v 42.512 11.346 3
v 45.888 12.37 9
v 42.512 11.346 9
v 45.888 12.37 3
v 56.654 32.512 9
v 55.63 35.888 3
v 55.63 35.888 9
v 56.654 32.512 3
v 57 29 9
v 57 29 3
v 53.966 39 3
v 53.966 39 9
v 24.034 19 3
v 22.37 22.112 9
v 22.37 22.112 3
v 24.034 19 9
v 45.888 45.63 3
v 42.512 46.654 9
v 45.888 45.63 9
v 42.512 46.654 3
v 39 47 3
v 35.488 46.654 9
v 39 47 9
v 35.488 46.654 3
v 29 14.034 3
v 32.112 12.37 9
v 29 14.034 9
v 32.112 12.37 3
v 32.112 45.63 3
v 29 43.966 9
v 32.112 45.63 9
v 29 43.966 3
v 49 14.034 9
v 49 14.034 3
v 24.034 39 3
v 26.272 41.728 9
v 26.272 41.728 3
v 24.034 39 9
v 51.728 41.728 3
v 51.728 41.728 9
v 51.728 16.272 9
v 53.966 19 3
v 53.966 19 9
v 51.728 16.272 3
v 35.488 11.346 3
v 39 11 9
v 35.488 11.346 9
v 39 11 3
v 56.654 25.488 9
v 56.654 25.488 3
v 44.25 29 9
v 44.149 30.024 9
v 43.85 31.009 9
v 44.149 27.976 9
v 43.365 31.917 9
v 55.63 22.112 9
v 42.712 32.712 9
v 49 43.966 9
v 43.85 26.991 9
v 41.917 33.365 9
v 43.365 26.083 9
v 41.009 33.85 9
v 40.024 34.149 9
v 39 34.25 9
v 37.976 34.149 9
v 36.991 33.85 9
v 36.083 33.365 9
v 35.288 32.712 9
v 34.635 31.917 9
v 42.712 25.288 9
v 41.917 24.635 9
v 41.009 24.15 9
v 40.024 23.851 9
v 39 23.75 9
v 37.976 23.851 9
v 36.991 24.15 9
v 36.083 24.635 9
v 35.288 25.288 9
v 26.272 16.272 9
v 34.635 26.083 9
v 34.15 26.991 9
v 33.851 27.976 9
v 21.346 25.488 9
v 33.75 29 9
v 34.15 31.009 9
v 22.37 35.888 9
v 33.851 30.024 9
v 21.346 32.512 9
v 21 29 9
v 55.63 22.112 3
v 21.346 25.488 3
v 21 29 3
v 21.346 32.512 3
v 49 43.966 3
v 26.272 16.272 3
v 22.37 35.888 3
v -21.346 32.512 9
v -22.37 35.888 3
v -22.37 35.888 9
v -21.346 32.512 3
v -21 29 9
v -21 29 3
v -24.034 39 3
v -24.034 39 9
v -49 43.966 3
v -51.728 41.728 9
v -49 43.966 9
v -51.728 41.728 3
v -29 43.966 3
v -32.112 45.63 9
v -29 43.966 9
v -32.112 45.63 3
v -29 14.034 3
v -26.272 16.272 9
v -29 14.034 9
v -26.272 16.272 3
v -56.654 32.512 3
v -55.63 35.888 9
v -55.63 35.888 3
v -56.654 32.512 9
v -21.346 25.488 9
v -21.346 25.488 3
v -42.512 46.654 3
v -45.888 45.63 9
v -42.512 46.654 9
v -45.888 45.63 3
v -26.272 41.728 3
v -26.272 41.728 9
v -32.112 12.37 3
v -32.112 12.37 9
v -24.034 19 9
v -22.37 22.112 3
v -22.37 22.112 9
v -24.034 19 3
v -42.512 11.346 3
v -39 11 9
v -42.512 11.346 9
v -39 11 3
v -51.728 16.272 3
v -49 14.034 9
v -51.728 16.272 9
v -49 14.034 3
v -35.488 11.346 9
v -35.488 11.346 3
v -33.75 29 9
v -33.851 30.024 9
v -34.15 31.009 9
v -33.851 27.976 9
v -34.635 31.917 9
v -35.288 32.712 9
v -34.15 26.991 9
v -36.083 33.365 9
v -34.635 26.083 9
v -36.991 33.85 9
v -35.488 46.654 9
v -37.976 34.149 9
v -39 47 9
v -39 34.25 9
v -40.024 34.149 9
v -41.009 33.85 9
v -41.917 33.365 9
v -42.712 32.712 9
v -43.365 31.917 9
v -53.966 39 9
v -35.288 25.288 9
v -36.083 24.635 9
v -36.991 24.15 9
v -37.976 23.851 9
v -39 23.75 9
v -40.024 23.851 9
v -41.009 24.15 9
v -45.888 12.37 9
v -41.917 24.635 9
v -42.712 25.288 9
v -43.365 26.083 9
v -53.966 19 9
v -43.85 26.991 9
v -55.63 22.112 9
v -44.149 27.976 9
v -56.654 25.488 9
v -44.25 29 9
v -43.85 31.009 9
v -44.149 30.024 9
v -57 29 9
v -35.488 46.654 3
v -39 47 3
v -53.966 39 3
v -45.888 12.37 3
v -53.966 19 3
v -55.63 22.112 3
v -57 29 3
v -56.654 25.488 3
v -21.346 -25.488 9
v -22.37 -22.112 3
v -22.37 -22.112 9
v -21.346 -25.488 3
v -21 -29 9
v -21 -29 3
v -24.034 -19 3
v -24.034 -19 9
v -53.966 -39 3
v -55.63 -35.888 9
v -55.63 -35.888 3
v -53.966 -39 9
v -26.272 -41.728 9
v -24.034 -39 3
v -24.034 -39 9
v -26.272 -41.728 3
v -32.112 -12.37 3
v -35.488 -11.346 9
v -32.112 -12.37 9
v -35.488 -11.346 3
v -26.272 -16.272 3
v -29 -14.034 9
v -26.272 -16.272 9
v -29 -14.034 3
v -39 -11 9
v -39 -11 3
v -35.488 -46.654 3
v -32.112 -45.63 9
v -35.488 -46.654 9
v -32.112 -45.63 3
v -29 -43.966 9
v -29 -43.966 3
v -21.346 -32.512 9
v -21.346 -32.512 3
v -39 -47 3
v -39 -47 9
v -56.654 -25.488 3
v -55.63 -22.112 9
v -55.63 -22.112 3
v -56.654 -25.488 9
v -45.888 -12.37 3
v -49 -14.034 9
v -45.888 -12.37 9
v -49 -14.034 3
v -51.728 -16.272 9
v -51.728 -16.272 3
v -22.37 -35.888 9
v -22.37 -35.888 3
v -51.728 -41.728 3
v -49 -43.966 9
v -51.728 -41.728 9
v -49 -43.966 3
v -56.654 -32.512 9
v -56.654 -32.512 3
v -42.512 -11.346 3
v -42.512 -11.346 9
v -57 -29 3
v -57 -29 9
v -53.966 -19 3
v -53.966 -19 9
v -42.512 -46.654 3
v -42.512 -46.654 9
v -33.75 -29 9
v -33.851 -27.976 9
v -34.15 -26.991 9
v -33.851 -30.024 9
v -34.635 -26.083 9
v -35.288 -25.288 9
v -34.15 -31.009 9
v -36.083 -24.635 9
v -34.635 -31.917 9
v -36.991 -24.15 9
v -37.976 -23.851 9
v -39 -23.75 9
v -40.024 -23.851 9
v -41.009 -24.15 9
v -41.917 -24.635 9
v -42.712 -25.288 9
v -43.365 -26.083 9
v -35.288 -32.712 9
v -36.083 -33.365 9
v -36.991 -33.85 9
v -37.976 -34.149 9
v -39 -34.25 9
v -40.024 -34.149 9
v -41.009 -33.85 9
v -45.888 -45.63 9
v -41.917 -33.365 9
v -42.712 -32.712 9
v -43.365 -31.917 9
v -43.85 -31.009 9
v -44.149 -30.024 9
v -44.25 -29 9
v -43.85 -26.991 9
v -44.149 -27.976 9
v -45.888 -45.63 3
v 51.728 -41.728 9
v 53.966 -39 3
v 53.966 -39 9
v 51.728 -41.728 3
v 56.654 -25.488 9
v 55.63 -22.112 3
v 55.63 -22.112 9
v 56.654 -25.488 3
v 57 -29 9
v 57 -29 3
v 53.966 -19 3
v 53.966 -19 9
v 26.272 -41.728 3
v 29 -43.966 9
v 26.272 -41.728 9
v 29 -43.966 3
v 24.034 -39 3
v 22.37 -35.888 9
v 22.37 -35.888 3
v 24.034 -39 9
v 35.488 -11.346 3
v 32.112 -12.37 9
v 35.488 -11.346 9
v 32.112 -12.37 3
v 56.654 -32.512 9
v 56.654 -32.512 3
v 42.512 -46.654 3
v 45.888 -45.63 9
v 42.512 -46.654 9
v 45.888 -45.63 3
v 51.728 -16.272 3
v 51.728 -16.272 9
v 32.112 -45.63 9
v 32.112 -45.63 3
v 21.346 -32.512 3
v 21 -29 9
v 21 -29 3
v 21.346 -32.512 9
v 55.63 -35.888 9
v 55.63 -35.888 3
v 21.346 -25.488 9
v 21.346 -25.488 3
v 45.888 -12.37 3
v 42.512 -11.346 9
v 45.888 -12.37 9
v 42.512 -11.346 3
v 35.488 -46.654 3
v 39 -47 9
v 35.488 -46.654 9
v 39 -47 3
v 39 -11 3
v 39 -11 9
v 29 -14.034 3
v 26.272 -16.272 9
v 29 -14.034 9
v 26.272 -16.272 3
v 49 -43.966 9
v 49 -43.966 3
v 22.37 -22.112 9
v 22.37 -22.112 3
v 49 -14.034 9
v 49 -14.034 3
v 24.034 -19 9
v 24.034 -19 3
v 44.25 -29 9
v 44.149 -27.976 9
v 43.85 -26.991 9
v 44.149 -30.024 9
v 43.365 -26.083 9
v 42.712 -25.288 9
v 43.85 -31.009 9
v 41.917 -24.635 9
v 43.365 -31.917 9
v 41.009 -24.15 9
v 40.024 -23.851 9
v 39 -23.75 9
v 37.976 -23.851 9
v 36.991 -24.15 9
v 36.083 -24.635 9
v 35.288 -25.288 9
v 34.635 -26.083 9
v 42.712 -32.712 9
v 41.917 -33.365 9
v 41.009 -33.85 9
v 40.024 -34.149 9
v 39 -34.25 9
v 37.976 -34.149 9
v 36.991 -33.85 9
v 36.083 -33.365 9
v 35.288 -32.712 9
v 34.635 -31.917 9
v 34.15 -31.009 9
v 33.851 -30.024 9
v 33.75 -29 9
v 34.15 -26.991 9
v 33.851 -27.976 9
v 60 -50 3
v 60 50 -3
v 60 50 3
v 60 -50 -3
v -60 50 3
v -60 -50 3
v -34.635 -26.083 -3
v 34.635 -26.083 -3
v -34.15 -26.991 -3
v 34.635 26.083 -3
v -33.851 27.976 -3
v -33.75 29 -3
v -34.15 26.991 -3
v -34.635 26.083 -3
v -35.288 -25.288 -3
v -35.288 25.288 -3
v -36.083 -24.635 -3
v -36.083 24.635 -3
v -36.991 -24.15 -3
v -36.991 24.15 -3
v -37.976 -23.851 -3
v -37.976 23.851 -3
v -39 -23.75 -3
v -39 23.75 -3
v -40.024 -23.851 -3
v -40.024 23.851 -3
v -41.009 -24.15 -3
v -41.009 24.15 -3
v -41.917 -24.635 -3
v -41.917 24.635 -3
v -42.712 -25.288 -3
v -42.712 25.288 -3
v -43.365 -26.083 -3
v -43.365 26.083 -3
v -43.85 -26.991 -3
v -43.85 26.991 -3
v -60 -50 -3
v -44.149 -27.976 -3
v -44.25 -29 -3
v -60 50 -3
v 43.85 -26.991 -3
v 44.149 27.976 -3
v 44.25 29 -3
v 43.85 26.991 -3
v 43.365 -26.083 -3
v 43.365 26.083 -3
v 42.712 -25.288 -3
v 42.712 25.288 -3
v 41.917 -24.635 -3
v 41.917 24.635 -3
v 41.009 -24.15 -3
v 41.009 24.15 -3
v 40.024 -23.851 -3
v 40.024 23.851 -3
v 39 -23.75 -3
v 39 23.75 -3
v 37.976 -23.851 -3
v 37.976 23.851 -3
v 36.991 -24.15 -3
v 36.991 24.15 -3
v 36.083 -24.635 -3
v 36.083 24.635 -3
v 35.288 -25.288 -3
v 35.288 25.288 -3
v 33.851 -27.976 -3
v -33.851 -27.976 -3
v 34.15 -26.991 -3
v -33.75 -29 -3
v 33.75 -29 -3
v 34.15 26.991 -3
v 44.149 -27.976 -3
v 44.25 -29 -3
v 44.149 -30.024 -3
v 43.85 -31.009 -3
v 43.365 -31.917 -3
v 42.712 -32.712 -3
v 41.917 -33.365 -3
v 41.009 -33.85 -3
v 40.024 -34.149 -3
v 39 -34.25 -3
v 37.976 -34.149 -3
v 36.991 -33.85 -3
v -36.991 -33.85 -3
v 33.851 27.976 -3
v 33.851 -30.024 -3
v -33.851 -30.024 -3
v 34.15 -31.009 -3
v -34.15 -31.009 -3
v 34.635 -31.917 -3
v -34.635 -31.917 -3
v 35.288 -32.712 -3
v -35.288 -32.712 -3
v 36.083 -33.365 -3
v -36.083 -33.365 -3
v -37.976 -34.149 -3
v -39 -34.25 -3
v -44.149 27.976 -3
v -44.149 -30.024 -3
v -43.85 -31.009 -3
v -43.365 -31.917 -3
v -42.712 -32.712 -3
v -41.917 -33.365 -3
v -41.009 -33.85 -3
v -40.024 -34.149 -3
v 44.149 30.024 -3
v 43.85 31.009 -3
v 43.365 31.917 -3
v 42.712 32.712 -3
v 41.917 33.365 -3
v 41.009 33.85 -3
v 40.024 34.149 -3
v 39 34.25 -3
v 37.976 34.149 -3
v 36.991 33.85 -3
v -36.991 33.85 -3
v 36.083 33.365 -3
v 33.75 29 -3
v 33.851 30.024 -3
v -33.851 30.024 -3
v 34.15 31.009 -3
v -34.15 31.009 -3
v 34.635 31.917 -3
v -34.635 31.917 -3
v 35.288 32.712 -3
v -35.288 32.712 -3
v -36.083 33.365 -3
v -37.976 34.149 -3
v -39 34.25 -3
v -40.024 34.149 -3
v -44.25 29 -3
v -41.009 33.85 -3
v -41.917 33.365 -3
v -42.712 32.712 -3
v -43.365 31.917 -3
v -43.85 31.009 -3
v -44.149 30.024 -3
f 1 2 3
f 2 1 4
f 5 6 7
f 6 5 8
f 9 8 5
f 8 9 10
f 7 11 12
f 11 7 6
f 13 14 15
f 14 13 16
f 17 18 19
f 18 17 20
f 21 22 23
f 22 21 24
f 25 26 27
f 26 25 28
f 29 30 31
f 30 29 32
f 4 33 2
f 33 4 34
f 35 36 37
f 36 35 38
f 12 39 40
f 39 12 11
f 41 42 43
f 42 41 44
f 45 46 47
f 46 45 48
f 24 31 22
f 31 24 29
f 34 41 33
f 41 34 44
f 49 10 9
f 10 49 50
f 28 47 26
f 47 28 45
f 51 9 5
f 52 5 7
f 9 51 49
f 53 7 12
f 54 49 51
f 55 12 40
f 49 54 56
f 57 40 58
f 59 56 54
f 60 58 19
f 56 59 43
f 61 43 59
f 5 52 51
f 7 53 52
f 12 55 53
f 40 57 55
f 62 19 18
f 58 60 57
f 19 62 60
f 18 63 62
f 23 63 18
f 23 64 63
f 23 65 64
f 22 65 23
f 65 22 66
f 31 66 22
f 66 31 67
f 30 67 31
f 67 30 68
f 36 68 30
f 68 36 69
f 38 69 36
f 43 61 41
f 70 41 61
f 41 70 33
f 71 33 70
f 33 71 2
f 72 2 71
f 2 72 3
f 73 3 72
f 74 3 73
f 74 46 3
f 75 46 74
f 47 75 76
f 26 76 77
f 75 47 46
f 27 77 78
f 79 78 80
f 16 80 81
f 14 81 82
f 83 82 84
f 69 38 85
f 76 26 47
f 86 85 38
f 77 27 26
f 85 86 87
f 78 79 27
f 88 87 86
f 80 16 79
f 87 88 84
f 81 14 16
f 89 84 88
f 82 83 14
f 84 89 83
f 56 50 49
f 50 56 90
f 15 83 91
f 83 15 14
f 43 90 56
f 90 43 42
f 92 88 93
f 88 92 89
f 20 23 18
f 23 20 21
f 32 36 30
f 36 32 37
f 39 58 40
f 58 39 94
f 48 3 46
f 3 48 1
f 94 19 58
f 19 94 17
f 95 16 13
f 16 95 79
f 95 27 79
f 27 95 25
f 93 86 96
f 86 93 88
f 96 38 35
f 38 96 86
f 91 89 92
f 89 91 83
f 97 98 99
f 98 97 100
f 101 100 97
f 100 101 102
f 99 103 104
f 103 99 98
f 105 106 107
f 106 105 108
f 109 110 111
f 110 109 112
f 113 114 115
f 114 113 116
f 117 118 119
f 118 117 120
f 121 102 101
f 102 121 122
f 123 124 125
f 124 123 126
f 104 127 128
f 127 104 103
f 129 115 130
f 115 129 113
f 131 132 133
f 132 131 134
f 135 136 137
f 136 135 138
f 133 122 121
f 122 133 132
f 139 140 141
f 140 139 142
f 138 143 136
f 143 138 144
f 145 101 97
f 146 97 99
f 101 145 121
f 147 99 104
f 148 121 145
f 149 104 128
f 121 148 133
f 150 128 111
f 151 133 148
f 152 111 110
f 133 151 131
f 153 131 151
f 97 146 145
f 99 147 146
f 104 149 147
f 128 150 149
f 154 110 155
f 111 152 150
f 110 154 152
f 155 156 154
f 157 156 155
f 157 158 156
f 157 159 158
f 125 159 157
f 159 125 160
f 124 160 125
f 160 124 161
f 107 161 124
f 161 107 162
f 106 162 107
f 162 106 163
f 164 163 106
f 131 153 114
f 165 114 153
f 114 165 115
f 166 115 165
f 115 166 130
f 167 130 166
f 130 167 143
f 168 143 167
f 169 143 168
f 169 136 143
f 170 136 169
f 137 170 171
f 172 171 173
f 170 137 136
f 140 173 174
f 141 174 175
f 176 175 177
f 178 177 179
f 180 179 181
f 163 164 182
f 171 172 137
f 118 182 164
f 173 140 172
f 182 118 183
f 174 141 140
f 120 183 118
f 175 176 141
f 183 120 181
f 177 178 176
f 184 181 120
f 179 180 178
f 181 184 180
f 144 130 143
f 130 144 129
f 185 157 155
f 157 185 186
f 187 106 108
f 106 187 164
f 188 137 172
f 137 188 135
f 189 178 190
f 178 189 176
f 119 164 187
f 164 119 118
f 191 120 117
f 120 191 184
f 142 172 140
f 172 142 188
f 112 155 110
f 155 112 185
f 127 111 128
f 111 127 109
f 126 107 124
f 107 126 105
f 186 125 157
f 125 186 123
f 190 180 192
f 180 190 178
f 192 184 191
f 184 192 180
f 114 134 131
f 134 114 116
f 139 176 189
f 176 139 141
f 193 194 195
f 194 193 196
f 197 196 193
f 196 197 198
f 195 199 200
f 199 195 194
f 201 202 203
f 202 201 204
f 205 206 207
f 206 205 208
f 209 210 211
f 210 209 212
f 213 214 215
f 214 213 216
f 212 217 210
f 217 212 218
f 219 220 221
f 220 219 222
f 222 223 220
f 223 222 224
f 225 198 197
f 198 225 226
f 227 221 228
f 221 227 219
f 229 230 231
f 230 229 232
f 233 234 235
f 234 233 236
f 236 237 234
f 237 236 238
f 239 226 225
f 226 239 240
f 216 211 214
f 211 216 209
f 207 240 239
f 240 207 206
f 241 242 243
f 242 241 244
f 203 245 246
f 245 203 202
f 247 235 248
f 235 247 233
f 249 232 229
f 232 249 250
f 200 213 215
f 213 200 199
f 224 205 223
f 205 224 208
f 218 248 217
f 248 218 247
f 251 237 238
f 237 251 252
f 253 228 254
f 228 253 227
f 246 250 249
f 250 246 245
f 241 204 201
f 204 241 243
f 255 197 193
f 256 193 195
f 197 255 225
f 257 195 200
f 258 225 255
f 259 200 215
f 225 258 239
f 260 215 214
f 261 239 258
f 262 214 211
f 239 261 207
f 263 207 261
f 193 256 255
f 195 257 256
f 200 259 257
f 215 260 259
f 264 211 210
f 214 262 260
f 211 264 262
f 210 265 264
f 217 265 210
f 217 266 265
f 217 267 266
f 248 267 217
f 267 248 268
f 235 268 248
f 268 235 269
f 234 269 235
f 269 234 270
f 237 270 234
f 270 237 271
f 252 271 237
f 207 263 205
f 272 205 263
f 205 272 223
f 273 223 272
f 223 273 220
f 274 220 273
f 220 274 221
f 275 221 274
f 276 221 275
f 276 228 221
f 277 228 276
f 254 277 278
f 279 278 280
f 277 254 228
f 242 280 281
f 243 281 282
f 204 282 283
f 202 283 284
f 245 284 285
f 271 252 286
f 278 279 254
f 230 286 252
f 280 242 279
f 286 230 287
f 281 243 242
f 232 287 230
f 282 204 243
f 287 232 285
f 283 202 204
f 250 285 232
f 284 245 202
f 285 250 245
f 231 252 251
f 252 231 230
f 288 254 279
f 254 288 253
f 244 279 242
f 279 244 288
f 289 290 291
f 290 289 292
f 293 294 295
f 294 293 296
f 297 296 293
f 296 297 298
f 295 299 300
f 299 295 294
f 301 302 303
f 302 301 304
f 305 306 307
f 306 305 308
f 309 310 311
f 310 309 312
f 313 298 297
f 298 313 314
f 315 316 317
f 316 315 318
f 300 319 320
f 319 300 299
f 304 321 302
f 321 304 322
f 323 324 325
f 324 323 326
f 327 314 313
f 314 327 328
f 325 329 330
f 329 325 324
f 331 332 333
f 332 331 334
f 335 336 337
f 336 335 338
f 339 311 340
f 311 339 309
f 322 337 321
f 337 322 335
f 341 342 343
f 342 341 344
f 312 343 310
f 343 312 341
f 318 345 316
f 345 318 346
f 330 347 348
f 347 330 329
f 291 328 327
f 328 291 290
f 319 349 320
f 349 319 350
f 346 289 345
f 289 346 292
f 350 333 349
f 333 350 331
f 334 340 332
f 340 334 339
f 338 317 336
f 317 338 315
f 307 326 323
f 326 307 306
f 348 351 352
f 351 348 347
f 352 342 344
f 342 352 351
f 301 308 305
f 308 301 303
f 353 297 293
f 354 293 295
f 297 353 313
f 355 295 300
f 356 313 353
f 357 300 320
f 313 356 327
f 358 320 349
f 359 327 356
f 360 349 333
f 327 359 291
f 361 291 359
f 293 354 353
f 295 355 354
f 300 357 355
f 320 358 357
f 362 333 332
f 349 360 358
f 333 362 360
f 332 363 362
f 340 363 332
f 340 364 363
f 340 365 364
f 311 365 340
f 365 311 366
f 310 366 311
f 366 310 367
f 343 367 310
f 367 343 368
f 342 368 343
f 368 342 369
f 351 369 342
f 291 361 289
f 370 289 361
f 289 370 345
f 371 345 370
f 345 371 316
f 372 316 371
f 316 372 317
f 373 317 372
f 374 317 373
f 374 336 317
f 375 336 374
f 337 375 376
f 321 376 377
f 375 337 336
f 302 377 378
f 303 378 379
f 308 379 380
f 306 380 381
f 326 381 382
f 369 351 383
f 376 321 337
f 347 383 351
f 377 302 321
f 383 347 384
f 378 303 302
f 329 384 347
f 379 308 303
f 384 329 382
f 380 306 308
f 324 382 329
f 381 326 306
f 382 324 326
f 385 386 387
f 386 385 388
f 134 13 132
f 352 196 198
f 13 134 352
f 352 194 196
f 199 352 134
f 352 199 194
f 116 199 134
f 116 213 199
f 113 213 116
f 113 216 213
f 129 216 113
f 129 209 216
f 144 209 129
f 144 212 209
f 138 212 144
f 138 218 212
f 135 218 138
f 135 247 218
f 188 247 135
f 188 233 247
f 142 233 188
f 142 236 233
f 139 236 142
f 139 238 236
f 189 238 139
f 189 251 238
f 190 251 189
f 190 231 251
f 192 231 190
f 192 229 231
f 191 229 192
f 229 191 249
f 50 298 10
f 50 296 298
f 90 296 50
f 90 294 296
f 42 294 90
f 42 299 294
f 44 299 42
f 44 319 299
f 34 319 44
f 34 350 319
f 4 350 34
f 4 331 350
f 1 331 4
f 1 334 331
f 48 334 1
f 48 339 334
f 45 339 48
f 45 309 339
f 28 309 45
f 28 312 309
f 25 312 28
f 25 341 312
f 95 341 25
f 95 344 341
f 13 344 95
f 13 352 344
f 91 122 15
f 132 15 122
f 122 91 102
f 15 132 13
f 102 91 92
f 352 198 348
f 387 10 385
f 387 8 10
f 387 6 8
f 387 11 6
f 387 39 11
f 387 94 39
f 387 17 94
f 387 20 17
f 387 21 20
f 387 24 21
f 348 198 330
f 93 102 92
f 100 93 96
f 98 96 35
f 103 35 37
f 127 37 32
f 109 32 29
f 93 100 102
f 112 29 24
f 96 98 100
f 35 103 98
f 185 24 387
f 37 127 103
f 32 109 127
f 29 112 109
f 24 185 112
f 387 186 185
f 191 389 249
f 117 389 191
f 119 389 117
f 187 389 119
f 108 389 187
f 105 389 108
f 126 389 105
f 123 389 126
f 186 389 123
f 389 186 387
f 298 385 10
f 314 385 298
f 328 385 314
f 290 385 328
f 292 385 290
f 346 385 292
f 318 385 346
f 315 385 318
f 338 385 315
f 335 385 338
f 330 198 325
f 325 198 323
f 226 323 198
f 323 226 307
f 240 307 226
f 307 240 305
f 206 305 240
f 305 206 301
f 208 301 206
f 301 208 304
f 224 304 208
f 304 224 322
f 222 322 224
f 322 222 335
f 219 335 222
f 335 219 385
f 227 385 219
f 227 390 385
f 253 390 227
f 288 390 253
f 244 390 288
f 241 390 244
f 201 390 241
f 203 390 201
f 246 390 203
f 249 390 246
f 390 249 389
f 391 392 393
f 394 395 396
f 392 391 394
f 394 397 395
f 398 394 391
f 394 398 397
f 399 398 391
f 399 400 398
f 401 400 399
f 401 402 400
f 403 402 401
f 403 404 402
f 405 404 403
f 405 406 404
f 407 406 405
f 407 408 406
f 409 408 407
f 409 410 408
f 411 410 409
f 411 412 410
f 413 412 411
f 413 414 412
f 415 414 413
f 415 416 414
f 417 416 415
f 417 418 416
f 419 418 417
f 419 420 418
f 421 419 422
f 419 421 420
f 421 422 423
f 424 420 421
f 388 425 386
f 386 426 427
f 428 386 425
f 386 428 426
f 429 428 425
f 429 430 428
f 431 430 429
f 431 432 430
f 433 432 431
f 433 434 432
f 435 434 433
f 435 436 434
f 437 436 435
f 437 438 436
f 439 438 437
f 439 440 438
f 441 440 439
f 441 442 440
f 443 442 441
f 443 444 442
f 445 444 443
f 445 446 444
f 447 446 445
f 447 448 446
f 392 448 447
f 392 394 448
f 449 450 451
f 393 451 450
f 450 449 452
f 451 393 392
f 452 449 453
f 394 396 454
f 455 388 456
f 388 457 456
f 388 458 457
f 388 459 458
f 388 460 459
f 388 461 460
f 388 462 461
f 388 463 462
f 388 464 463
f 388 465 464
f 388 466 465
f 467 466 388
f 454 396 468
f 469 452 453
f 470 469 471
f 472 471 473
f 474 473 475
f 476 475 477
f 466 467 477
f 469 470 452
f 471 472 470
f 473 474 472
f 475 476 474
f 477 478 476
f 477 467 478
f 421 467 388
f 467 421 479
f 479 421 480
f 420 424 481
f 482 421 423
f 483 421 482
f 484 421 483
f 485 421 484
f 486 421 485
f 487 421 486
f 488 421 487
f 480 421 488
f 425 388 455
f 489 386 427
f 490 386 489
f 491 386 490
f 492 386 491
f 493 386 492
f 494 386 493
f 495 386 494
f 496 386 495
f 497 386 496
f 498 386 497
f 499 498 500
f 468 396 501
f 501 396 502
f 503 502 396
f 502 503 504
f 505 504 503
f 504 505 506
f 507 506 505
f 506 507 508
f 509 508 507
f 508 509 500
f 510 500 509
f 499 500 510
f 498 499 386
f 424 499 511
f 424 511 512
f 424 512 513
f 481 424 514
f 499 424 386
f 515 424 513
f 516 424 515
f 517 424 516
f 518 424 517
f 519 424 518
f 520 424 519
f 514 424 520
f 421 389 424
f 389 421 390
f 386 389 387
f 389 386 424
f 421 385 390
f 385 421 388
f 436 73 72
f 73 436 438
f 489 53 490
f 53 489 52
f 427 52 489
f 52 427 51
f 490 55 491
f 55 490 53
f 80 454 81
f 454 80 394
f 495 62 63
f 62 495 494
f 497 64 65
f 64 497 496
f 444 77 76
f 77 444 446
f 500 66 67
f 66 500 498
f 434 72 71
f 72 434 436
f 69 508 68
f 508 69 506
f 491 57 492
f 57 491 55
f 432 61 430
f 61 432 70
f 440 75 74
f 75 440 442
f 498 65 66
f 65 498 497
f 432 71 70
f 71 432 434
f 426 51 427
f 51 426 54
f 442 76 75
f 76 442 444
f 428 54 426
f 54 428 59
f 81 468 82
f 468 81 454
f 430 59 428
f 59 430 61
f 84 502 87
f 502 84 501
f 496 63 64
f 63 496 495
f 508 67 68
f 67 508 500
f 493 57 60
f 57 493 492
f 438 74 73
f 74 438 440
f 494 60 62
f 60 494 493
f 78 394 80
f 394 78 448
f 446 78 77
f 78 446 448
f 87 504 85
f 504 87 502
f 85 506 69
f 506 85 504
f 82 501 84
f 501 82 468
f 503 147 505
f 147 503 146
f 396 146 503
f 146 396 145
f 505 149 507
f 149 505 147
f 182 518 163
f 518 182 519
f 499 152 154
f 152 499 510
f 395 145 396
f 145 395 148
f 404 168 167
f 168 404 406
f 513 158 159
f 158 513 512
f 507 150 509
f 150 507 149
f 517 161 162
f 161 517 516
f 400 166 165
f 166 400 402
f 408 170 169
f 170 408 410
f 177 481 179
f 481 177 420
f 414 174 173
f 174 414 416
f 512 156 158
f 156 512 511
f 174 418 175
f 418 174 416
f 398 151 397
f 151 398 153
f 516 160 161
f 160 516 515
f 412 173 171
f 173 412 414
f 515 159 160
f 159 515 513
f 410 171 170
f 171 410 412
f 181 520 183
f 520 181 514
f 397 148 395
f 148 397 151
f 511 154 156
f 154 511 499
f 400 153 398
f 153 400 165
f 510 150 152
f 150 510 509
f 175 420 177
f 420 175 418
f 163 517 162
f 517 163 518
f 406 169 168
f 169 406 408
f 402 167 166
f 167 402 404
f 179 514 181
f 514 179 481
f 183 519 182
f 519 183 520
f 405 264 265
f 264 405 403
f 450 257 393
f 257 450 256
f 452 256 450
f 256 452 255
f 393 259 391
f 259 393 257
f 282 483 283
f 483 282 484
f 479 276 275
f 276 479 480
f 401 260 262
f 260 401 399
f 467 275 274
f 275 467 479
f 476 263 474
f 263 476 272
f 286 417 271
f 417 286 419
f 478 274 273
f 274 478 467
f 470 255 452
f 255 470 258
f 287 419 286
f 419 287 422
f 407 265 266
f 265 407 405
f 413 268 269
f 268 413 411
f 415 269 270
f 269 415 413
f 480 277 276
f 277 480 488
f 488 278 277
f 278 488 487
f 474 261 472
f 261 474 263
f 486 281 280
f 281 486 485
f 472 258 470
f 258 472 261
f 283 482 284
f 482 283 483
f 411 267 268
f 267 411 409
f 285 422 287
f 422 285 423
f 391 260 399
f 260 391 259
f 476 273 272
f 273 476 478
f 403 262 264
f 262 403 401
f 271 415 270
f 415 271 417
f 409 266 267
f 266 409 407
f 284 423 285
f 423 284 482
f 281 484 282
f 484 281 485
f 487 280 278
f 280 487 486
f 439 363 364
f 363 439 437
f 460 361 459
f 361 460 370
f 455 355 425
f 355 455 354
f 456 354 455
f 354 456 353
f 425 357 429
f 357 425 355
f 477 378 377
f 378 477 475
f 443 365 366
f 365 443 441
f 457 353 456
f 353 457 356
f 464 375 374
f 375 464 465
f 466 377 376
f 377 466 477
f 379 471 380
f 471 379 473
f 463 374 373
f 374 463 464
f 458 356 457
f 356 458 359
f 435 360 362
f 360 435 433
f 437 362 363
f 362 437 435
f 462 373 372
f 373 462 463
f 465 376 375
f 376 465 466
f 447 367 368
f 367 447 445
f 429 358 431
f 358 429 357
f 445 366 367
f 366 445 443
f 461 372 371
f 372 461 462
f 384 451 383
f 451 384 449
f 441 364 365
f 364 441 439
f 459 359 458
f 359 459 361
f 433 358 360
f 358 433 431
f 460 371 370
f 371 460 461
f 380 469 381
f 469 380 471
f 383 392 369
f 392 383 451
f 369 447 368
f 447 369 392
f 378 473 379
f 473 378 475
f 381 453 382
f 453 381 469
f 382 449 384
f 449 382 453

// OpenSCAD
$fn = 32;

// ----------------------------------------------------------------------
// Anchor pads 120 x 100 x 12
// four corner bosses with anchor holes
// ----------------------------------------------------------------------

// --- parameters (mm) ---
plate = [120, 100, 6];  // base plate size (x, y, z)
pads = 4;               // boss count, one per corner
edge = 21;              // boss centre offset from the plate edge
boss_d = 36;            // boss diameter
boss_h = 6;             // boss height above the base plate
hole_d = 10.5;          // hole diameter

// --- derived feature positions (mm) ---
height = plate[2] + boss_h;      // = 12   overall height of the part
corner_x = plate[0] / 2 - edge;  // = 39   boss centre X
corner_y = plate[1] / 2 - edge;  // = 29   boss centre Y
feature_centers = [
  [corner_x, corner_y],
  [-corner_x, corner_y],
  [-corner_x, -corner_y],
  [corner_x, -corner_y]
];   // boss centres, anchor holes are drilled there

// base plate, four bosses standing on it, anchor holes all the way through
difference() {
  union() {
    cube(plate, center = true);
    for (centre = feature_centers)
      translate([centre[0], centre[1], plate[2] / 2 - 1])
        cylinder(d = boss_d, h = boss_h + 1);
  }
  for (centre = feature_centers)
    translate([centre[0], centre[1], -height])
      cylinder(d = hole_d, h = 2 * height + 2);  // through boss and plate
}
